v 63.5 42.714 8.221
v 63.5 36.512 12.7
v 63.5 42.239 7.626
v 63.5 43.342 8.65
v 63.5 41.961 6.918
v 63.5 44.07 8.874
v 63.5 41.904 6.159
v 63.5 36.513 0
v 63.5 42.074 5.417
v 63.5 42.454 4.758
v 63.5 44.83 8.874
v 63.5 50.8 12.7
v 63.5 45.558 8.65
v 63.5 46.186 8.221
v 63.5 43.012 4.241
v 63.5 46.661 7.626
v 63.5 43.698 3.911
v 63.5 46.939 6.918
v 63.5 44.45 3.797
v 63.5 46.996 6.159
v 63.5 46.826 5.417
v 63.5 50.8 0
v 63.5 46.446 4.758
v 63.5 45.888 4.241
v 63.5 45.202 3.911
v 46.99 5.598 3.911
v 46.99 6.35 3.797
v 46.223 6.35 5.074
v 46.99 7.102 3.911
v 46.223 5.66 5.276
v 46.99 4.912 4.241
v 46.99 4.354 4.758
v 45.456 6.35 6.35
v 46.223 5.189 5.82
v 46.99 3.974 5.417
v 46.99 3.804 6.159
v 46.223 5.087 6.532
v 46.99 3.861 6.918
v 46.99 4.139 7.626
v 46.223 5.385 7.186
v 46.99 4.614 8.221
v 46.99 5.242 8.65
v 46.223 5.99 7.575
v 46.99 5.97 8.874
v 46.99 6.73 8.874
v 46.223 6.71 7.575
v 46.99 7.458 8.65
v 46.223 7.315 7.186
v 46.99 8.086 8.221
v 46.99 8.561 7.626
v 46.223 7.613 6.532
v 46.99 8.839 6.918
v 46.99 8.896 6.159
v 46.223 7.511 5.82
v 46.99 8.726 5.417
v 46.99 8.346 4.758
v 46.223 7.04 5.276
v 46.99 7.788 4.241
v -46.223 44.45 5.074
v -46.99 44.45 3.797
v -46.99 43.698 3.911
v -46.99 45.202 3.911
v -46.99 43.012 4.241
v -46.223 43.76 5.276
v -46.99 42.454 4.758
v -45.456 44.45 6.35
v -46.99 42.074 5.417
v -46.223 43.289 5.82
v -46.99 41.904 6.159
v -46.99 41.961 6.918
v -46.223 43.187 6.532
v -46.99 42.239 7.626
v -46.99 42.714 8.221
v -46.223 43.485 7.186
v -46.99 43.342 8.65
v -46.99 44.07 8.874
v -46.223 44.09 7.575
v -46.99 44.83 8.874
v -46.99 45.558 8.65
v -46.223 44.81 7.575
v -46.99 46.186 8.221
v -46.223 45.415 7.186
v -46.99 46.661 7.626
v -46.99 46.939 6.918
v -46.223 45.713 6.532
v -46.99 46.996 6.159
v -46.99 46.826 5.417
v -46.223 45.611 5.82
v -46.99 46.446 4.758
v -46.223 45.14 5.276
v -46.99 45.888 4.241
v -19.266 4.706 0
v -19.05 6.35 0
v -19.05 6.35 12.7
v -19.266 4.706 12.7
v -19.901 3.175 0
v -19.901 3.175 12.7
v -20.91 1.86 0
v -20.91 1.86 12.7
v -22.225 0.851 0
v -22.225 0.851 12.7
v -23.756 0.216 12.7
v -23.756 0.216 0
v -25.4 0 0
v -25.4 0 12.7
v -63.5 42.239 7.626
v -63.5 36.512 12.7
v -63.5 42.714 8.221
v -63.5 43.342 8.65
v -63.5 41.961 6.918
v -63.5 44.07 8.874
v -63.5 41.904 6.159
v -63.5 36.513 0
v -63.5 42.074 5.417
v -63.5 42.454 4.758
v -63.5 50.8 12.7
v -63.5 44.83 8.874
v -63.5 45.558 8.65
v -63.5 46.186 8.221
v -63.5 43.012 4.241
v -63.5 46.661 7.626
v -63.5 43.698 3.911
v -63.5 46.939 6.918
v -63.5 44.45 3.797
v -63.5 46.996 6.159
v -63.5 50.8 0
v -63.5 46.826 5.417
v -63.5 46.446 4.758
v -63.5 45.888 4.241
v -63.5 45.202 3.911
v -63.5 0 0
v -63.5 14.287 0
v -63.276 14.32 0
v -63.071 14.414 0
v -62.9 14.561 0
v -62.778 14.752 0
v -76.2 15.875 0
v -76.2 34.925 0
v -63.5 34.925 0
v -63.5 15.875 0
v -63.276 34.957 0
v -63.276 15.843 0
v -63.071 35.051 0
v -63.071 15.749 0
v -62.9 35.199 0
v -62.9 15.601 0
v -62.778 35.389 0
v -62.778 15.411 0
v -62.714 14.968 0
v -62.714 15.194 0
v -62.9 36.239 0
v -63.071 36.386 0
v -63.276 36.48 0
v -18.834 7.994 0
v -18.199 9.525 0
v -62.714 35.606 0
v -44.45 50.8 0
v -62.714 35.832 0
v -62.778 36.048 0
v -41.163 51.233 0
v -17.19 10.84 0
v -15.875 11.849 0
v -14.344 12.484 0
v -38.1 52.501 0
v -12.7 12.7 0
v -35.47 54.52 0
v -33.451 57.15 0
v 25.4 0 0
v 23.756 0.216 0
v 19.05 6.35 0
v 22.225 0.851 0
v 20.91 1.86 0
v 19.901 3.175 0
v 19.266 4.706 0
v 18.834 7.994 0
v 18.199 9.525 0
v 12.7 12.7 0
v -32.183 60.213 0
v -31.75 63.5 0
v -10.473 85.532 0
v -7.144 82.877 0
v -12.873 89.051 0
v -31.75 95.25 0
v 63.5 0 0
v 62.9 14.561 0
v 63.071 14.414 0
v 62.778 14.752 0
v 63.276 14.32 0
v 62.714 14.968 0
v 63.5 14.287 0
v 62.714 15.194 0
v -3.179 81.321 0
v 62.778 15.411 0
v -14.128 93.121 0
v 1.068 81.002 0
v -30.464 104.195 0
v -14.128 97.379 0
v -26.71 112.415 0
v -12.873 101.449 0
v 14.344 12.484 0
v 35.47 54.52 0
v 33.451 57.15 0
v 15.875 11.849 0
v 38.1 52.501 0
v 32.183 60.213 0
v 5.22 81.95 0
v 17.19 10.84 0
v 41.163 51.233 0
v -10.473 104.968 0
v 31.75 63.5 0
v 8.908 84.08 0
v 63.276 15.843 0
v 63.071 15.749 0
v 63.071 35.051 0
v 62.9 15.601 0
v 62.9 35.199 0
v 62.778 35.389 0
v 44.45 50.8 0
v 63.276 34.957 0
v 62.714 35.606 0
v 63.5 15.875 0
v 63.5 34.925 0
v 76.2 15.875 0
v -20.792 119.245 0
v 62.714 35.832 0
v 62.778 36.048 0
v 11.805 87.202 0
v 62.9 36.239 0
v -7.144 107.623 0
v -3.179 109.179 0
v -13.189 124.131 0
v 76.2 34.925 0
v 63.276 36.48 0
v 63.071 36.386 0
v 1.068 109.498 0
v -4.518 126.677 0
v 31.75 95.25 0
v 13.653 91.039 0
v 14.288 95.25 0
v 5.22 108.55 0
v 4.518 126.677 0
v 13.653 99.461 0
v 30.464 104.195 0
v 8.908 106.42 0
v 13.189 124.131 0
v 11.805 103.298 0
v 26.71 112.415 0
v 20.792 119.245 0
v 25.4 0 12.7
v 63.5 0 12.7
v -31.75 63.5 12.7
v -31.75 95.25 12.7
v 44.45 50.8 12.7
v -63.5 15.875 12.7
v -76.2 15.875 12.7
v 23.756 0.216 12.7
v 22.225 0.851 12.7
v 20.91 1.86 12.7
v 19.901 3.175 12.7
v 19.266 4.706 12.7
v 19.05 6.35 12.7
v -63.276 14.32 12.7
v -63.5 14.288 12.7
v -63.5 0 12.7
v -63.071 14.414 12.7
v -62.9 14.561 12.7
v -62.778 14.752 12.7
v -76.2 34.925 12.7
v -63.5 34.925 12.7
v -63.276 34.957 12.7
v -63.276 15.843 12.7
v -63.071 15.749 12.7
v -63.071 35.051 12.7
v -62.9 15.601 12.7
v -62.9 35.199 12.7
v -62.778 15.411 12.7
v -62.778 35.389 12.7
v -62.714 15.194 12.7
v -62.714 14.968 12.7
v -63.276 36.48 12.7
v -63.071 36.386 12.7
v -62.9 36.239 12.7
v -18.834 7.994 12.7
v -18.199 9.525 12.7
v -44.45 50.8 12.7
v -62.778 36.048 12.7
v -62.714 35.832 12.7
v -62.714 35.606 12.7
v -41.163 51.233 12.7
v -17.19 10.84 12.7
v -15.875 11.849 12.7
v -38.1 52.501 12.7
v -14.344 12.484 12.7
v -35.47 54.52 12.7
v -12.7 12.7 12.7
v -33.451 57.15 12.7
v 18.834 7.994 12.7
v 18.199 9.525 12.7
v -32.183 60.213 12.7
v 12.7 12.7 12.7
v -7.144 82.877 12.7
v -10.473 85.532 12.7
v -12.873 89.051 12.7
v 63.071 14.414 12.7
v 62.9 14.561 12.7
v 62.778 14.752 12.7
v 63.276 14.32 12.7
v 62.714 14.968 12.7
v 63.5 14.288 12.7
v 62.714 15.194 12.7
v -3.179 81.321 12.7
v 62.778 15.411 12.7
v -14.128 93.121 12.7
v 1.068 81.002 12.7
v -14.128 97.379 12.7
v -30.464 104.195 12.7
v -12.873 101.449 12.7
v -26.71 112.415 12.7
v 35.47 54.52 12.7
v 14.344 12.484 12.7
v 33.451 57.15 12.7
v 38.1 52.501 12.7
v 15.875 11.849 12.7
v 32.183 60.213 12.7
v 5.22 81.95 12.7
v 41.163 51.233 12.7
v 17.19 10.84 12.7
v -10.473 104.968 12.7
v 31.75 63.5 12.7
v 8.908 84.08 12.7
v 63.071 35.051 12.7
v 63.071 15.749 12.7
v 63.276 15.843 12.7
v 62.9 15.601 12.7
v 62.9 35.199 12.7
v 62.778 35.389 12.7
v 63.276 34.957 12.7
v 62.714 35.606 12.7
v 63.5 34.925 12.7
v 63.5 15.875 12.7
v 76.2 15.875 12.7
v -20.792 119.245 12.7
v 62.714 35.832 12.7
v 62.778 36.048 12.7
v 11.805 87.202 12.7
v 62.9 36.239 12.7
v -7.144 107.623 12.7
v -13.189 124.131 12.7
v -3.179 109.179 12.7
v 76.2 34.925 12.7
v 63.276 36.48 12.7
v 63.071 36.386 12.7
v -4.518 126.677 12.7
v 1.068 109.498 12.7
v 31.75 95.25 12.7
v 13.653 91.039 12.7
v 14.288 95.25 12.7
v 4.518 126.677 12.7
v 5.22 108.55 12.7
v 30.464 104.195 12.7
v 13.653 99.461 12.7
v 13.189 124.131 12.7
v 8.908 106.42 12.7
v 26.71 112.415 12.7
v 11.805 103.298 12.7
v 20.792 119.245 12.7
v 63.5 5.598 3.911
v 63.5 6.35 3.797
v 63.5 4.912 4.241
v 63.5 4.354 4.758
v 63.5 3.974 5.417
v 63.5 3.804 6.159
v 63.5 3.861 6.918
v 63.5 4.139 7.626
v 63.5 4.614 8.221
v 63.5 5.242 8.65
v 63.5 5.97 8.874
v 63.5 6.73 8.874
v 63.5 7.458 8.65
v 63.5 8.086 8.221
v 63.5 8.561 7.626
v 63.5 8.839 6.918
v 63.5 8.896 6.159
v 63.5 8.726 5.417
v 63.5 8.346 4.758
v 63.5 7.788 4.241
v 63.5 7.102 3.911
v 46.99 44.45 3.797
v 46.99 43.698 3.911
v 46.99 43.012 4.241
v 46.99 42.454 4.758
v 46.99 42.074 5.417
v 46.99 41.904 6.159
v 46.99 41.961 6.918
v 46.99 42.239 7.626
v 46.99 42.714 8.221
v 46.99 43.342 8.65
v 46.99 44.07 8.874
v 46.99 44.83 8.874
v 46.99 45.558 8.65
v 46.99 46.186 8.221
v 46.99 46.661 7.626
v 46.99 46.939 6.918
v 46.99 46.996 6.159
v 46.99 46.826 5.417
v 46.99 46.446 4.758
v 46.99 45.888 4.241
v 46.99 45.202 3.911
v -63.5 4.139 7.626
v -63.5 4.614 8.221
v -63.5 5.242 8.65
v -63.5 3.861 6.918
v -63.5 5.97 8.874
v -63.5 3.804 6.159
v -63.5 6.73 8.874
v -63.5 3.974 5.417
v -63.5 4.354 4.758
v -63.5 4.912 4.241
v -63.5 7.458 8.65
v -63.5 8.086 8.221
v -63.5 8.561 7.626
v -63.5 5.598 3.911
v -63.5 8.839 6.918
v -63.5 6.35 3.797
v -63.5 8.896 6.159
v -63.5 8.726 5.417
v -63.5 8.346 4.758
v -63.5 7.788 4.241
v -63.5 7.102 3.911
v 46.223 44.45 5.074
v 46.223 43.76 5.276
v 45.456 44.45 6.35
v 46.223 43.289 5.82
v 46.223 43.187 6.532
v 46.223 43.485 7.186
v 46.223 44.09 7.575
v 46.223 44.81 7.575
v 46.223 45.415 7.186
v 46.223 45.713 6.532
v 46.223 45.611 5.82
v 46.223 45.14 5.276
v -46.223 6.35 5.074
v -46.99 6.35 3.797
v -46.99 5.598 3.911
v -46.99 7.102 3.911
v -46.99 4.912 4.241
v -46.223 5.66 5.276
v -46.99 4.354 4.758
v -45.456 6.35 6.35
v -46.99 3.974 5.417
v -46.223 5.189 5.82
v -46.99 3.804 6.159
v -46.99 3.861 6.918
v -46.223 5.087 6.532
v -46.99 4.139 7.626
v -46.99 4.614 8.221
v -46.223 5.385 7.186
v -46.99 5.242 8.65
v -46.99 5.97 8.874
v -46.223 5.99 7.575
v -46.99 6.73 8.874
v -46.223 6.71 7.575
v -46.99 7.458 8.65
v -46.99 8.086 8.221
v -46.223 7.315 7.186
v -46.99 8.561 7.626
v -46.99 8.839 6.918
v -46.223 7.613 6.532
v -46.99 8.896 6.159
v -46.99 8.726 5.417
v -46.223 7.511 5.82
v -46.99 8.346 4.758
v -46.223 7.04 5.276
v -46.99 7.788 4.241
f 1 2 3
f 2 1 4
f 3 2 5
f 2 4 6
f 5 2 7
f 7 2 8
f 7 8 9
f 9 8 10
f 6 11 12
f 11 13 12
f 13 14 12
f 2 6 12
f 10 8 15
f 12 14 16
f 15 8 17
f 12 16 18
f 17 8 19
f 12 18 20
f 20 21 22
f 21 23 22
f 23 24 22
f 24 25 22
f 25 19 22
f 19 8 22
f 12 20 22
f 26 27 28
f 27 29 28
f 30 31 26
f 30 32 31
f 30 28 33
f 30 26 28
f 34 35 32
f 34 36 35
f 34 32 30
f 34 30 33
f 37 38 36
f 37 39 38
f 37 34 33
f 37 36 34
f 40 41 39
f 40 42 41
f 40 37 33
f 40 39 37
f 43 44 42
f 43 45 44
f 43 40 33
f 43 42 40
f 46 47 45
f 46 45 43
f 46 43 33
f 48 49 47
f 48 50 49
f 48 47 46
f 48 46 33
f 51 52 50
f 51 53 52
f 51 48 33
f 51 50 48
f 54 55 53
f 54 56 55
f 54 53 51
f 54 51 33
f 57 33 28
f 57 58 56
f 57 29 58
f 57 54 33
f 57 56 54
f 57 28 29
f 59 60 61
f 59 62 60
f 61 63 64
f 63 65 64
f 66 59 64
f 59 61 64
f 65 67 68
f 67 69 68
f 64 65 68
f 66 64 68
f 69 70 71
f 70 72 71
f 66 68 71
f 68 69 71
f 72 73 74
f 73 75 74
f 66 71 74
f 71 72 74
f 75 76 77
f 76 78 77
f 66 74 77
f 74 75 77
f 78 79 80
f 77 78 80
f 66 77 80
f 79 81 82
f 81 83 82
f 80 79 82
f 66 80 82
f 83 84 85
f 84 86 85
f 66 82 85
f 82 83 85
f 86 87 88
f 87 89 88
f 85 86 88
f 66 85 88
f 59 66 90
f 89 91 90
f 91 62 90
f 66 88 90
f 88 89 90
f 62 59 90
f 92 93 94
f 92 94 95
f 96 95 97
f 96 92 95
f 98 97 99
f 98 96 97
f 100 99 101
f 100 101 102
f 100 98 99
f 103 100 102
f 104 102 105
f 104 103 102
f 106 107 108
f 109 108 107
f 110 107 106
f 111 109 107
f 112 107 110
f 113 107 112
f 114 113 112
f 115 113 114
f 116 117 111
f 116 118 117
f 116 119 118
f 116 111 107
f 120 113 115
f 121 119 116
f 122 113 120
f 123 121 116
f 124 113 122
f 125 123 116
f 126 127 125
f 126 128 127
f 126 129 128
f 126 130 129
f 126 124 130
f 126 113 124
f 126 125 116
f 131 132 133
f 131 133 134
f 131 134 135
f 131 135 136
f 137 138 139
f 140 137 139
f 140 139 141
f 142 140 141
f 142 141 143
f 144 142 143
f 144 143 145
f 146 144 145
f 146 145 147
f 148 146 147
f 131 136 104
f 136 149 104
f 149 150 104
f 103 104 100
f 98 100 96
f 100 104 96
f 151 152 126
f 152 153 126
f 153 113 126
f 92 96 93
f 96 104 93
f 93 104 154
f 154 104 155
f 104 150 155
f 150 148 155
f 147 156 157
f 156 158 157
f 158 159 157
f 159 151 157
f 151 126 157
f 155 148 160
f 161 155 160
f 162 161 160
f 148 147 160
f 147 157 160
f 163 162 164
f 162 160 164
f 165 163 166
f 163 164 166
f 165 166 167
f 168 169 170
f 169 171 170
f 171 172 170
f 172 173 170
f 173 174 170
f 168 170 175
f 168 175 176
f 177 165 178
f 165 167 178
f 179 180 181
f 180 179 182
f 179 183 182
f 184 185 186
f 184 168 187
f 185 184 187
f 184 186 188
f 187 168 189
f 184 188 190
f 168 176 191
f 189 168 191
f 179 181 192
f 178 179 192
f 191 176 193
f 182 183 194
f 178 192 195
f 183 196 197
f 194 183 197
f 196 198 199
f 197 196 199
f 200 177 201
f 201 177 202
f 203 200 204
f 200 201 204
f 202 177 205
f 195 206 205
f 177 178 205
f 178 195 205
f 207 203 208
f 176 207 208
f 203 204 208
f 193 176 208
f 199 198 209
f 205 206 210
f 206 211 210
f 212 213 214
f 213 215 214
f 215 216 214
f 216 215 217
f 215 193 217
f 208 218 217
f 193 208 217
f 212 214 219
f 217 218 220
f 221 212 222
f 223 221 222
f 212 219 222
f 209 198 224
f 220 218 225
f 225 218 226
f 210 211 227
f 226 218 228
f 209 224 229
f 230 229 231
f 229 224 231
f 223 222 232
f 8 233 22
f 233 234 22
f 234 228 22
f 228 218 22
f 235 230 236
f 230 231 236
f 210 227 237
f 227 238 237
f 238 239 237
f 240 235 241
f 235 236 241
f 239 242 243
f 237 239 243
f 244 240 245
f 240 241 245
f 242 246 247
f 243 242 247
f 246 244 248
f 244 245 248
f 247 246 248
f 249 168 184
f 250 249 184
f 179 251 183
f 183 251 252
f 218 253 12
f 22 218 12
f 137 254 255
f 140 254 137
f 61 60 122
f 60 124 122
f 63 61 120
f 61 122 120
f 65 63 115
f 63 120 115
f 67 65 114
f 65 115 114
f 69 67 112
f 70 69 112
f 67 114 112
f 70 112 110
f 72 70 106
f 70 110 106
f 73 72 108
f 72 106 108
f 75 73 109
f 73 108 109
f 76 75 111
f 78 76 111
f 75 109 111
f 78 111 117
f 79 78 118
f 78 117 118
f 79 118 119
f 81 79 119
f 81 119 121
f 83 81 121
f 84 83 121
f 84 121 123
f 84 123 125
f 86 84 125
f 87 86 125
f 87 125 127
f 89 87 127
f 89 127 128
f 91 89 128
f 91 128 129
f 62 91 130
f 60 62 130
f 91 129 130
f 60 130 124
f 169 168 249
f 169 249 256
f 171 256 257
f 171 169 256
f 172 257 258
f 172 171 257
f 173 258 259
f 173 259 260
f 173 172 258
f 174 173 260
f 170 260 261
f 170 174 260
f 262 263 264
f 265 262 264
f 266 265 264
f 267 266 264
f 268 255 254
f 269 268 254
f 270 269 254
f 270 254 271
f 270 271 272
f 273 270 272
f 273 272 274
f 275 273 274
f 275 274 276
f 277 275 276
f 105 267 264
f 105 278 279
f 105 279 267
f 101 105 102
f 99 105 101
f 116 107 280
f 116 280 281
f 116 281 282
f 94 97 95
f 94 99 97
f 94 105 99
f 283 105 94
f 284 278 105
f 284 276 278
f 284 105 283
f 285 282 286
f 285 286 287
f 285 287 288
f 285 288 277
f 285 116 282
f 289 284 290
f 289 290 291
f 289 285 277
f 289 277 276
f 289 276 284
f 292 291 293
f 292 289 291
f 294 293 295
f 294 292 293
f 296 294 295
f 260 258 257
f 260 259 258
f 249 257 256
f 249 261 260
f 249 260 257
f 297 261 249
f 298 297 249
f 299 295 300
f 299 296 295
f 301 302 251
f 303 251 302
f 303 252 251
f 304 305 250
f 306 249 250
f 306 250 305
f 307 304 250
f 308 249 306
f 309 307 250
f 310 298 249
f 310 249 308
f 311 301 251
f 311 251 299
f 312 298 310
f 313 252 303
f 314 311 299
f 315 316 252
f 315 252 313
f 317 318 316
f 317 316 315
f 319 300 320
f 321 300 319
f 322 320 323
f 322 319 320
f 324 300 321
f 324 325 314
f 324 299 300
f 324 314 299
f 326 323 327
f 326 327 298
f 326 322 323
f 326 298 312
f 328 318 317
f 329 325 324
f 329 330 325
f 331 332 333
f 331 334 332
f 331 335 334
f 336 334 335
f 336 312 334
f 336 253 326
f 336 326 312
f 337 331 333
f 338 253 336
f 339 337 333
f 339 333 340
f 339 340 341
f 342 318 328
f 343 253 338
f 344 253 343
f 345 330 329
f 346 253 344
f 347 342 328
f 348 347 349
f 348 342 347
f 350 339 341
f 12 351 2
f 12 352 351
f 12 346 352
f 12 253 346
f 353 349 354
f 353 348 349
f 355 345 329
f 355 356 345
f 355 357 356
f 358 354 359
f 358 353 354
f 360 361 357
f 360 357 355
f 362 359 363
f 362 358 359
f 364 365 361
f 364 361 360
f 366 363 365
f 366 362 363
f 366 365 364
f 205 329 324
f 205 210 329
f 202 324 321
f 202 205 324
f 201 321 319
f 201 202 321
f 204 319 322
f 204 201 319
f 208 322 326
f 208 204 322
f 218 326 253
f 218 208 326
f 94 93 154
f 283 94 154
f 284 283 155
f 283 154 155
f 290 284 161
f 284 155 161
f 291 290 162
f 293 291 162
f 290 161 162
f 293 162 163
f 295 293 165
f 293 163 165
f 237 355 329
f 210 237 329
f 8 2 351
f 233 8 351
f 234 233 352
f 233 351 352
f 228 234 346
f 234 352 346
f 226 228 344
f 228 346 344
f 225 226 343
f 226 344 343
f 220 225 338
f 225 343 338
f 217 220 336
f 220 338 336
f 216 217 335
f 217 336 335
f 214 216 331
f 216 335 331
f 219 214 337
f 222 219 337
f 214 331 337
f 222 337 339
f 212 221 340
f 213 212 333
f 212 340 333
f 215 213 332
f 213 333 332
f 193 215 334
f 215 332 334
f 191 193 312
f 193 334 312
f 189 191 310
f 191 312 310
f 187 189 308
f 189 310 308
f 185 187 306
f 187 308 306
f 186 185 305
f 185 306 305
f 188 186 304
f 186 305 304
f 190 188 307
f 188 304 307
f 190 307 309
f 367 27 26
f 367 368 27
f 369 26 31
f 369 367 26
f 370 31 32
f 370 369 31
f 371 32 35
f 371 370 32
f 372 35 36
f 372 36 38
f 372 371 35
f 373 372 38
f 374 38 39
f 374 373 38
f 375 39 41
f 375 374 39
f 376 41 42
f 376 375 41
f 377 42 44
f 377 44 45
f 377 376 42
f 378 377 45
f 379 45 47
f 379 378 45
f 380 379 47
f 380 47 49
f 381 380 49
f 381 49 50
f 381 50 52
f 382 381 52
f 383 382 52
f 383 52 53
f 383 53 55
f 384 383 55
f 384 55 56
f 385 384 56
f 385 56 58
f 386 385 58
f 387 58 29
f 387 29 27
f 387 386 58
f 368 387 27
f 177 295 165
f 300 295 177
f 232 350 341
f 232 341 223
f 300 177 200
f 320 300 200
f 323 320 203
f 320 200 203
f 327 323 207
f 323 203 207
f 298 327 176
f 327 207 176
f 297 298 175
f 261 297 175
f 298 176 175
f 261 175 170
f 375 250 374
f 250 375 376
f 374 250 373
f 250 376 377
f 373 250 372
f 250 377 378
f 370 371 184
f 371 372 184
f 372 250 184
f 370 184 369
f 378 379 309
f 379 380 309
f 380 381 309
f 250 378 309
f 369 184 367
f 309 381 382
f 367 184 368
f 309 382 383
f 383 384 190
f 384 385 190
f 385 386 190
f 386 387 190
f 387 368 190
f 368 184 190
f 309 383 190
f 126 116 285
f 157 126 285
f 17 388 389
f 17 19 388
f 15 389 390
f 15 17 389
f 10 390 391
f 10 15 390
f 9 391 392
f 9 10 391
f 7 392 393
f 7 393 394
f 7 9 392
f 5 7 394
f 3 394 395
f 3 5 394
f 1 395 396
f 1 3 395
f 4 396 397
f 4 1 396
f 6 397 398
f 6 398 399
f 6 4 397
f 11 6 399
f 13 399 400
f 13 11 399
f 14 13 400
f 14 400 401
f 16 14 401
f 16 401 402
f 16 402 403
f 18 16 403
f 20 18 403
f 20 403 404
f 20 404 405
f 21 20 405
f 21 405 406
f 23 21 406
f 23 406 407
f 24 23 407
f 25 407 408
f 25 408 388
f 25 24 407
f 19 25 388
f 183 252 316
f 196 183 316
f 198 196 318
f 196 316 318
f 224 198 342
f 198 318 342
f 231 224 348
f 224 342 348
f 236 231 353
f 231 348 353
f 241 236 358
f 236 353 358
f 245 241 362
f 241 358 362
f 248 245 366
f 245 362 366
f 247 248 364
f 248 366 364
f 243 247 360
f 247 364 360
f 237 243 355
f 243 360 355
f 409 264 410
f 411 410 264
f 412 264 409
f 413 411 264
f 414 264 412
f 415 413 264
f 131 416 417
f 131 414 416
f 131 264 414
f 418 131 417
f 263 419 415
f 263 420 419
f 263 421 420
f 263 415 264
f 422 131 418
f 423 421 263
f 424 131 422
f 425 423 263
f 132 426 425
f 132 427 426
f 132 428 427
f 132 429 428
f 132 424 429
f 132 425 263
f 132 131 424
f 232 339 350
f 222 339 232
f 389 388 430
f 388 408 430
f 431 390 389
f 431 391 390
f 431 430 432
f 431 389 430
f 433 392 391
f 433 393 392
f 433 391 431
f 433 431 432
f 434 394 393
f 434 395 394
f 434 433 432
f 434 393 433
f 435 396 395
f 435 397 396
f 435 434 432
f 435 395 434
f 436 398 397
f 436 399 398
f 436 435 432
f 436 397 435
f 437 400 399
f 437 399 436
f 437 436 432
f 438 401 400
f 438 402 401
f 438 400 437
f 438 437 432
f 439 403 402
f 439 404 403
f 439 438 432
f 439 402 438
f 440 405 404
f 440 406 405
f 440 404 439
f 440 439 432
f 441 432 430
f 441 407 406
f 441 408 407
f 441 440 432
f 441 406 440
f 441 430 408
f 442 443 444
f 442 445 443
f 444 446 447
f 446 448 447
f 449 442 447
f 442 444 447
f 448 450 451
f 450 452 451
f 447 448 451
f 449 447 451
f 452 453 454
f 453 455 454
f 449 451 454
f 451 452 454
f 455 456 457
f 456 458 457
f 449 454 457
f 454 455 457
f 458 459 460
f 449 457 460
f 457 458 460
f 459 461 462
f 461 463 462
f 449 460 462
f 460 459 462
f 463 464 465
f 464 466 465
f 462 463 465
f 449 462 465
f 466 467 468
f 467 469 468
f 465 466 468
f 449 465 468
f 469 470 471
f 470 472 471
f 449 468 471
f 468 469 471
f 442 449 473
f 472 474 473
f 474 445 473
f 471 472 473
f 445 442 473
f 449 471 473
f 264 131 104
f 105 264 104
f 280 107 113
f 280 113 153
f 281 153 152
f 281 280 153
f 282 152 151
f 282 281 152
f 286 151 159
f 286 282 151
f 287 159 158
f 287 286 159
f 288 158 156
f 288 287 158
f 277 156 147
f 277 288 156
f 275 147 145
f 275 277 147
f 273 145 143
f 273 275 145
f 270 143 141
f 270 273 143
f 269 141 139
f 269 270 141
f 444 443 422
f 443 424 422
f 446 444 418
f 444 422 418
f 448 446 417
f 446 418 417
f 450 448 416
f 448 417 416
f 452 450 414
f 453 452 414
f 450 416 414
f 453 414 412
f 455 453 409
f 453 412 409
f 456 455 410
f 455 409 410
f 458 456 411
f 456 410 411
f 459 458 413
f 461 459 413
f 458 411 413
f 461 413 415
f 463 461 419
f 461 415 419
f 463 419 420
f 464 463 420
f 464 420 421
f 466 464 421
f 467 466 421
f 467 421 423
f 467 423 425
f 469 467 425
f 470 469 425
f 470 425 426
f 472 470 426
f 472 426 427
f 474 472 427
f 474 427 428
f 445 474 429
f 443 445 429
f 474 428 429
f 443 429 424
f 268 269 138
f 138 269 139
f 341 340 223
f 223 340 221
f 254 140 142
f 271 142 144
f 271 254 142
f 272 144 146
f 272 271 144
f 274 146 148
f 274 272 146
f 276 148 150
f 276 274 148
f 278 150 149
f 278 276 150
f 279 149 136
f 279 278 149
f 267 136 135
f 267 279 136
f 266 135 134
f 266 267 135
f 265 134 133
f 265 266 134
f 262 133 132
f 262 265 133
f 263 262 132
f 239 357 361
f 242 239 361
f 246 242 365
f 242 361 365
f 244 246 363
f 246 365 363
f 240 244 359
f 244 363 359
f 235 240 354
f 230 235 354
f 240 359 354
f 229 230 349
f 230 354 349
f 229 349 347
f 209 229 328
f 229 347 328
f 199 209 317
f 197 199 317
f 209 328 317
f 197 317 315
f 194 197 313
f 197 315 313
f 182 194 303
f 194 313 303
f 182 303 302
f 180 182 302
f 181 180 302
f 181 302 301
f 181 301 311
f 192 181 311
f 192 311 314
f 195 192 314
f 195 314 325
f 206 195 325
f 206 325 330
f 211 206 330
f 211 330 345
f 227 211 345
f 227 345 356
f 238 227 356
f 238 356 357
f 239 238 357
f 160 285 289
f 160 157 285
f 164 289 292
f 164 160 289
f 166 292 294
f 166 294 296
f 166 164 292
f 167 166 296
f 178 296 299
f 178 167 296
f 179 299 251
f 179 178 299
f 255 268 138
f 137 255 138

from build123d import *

# Parameters (mm, degrees)
SKETCH1_W                        = 127
SKETCH1_H                        = 152.4
BOSS_EXTRUDE1_DEPTH              = 12.7
SKETCH2_R                        = 14.2875
CUT_EXTRUDE1_DEPTH               = 166.587741092
FILLET1_R                        = 12.7
F_1_4_20_TAPPED_HOLE1_AT_2_COUNT = 2
F_1_4_20_TAPPED_HOLE1_AT_2_PITCH = 38.1
SKETCH5_W                        = 12.7
SKETCH5_H                        = 19.05
BOSS_EXTRUDE2_DEPTH              = 12.7
SKETCH6_R                        = 0.79375
CUT_EXTRUDE2_DEPTH               = 149.649688866
SKETCH7_W                        = 38.1
SKETCH7_H                        = 12.7
CUT_EXTRUDE3_DEPTH               = 149.649688866
FILLET2_START                    = -1
FILLET2_DEPTH                    = 15
FILLET2_2_DEPTH                  = 12.7


with BuildPart() as part:
    # Sketch1 → Boss-Extrude1 (new body)
    with BuildSketch(Plane.XY):
        with Locations((0, 76.2)):
            Rectangle(SKETCH1_W, SKETCH1_H)
    extrude(amount=BOSS_EXTRUDE1_DEPTH)

    # Sketch2 → Cut-Extrude1 (cut, through all)
    with BuildSketch(Plane.XY.offset(12.7)):
        with Locations((0, 95.25)):
            Circle(SKETCH2_R)
        with BuildLine():
            Line((31.75, 95.25), (31.75, 50.8))
            Line((31.75, 50.8), (63.5, 50.8))
            Line((63.5, 50.8), (63.5, 152.4))
            Line((63.5, 152.4), (-63.5, 152.4))
            Line((-63.5, 152.4), (-63.5, 50.8))
            Line((-63.5, 50.8), (-31.75, 50.8))
            Line((-31.75, 50.8), (-31.75, 95.25))
            ThreePointArc((-31.75, 95.25), (0, 127), (31.75, 95.25))
        make_face()
    extrude(amount=-CUT_EXTRUDE1_DEPTH, mode=Mode.SUBTRACT)

    # Fillet1
    fillet1_edges = [part.edges().sort_by_distance(p)[0] for p in [
        (-31.75, 50.8, 6.35),
        (31.75, 50.8, 6.35),
    ]]
    fillet(fillet1_edges, radius=FILLET1_R)

    # Sketch3 → 1/4-20 Tapped Hole1 (revolve, cut)
    with BuildSketch(Plane(origin=(63.5, 44.45, 6.35), x_dir=(0, 0, -1), z_dir=(0, 1, 0))):
        Polygon((0, 0), (0, 18.043816902), (2.5527, 16.51), (2.5527, 0), align=None)
    f_1_4_20_tapped_hole1 = revolve(axis=Axis((69.85, 44.45, 6.35), (-1, 0, 0)), mode=Mode.SUBTRACT)

    # 1/4-20 Tapped Hole1 at 2: 1/4-20 Tapped Hole1 ×2
    with Locations(*[(0, -i * F_1_4_20_TAPPED_HOLE1_AT_2_PITCH, 0) for i in range(1, F_1_4_20_TAPPED_HOLE1_AT_2_COUNT)]):
        add(f_1_4_20_tapped_hole1, mode=Mode.SUBTRACT)

    # Sketch5 → Boss-Extrude2 (add)
    with BuildSketch(Plane(origin=(63.5, 0, 0), x_dir=(0, 0, -1), z_dir=(1, 0, 0))):
        with Locations((-6.35, 25.4)):
            Rectangle(SKETCH5_W, SKETCH5_H)
    boss_extrude2 = extrude(amount=BOSS_EXTRUDE2_DEPTH)

    # Sketch6 → Cut-Extrude2 (cut, through all)
    with BuildSketch(Plane.XY.offset(12.7)):
        with Locations((63.5, 35.71875)):
            Circle(SKETCH6_R)
        with Locations((63.5, 15.08125)):
            Circle(SKETCH6_R)
    cut_extrude2 = extrude(amount=-CUT_EXTRUDE2_DEPTH, mode=Mode.SUBTRACT)

    # Mirror1: 1/4-20 Tapped Hole1, Boss-Extrude2, Cut-Extrude2 across plane
    add(f_1_4_20_tapped_hole1.mirror(Plane(origin=(0, 0, 0), x_dir=(0, 0, 1), z_dir=(1, 0, 0))), mode=Mode.SUBTRACT)
    add(boss_extrude2.mirror(Plane(origin=(0, 0, 0), x_dir=(0, 0, 1), z_dir=(1, 0, 0))))
    add(cut_extrude2.mirror(Plane(origin=(0, 0, 0), x_dir=(0, 0, 1), z_dir=(1, 0, 0))), mode=Mode.SUBTRACT)

    # Mirror1 copy 1 sketch → Mirror1 copy 1 (revolve, cut)
    with BuildSketch(Plane(origin=(-63.5, 6.35, 6.35), x_dir=(0, 0, -1), z_dir=(0, 1, 0))):
        Polygon((0, 0), (0, -18.043816902), (2.5527, -16.51), (2.5527, 0), align=None)
    revolve(axis=Axis((-69.85, 6.35, 6.35), (-1, 0, 0)), mode=Mode.SUBTRACT)

    # Sketch7 → Cut-Extrude3 (cut, through all)
    with BuildSketch(Plane.XY.offset(12.7)):
        with Locations((0, 6.35)):
            Rectangle(SKETCH7_W, SKETCH7_H)
    extrude(amount=-CUT_EXTRUDE3_DEPTH, mode=Mode.SUBTRACT)

    # Fillet2: read off the stored shape, not the designer's step
    # Fillet2 outline → Fillet2 (cut)
    with BuildSketch(Plane.XY.offset(FILLET2_START)):
        with BuildLine():
            Line((19.05, 0), (25.4, 0))
            ThreePointArc((25.4, 0), (20.909871939, 1.859871939), (19.05, 6.35))
            Line((19.05, 6.35), (19.05, 0))
        make_face()
        with BuildLine():
            Line((-19.05, 0), (-19.05, 6.35))
            ThreePointArc((-19.05, 6.35), (-20.909871939, 1.859871939), (-25.4, 0))
            Line((-25.4, 0), (-19.05, 0))
        make_face()
    extrude(amount=FILLET2_DEPTH, mode=Mode.SUBTRACT)

    # Fillet2 2 outline → Fillet2 2 (add)
    with BuildSketch(Plane.XY):
        with BuildLine():
            ThreePointArc((-19.05, 6.35), (-17.190128061, 10.840128061), (-12.7, 12.7))
            Line((-12.7, 12.7), (-19.05, 12.7))
            Line((-19.05, 12.7), (-19.05, 6.35))
        make_face()
        with BuildLine():
            ThreePointArc((12.7, 12.7), (17.190128061, 10.840128061), (19.05, 6.35))
            Line((19.05, 6.35), (19.05, 12.7))
            Line((19.05, 12.7), (12.7, 12.7))
        make_face()
    extrude(amount=FILLET2_2_DEPTH)


solid = part.part
